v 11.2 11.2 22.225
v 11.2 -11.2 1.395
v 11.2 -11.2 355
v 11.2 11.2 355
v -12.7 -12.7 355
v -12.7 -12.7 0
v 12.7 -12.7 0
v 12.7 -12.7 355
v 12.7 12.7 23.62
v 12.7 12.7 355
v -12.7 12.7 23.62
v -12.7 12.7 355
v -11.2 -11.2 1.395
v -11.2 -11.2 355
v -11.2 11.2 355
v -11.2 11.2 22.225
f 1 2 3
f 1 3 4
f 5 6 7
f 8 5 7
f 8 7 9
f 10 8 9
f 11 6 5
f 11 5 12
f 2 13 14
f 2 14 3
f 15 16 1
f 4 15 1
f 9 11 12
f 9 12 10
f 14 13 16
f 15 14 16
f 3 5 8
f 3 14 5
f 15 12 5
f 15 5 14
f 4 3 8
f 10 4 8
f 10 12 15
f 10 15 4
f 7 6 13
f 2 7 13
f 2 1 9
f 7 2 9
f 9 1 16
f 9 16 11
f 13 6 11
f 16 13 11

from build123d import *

# Parameters (mm, degrees)
SKETCH1_W           = 25.4
SKETCH1_H           = 25.4
SKETCH1_W_2         = 22.4
SKETCH1_H_2         = 22.4
BOSS_EXTRUDE1_DEPTH = 355
CUT_EXTRUDE2_DEPTH  = 25.4


with BuildPart() as part:
    # Sketch1 → Boss-Extrude1 (new body)
    with BuildSketch(Plane.XY):
        Rectangle(SKETCH1_W, SKETCH1_H)
        Rectangle(SKETCH1_W_2, SKETCH1_H_2, mode=Mode.SUBTRACT)
    extrude(amount=BOSS_EXTRUDE1_DEPTH)

    # Sketch3 → Cut-Extrude2 (cut)
    with BuildSketch(Plane.ZY.offset(12.7)):
        Polygon((0, -12.7), (23.62, 12.7), (0, 12.7), align=None)
    extrude(amount=-CUT_EXTRUDE2_DEPTH, mode=Mode.SUBTRACT)


solid = part.part
